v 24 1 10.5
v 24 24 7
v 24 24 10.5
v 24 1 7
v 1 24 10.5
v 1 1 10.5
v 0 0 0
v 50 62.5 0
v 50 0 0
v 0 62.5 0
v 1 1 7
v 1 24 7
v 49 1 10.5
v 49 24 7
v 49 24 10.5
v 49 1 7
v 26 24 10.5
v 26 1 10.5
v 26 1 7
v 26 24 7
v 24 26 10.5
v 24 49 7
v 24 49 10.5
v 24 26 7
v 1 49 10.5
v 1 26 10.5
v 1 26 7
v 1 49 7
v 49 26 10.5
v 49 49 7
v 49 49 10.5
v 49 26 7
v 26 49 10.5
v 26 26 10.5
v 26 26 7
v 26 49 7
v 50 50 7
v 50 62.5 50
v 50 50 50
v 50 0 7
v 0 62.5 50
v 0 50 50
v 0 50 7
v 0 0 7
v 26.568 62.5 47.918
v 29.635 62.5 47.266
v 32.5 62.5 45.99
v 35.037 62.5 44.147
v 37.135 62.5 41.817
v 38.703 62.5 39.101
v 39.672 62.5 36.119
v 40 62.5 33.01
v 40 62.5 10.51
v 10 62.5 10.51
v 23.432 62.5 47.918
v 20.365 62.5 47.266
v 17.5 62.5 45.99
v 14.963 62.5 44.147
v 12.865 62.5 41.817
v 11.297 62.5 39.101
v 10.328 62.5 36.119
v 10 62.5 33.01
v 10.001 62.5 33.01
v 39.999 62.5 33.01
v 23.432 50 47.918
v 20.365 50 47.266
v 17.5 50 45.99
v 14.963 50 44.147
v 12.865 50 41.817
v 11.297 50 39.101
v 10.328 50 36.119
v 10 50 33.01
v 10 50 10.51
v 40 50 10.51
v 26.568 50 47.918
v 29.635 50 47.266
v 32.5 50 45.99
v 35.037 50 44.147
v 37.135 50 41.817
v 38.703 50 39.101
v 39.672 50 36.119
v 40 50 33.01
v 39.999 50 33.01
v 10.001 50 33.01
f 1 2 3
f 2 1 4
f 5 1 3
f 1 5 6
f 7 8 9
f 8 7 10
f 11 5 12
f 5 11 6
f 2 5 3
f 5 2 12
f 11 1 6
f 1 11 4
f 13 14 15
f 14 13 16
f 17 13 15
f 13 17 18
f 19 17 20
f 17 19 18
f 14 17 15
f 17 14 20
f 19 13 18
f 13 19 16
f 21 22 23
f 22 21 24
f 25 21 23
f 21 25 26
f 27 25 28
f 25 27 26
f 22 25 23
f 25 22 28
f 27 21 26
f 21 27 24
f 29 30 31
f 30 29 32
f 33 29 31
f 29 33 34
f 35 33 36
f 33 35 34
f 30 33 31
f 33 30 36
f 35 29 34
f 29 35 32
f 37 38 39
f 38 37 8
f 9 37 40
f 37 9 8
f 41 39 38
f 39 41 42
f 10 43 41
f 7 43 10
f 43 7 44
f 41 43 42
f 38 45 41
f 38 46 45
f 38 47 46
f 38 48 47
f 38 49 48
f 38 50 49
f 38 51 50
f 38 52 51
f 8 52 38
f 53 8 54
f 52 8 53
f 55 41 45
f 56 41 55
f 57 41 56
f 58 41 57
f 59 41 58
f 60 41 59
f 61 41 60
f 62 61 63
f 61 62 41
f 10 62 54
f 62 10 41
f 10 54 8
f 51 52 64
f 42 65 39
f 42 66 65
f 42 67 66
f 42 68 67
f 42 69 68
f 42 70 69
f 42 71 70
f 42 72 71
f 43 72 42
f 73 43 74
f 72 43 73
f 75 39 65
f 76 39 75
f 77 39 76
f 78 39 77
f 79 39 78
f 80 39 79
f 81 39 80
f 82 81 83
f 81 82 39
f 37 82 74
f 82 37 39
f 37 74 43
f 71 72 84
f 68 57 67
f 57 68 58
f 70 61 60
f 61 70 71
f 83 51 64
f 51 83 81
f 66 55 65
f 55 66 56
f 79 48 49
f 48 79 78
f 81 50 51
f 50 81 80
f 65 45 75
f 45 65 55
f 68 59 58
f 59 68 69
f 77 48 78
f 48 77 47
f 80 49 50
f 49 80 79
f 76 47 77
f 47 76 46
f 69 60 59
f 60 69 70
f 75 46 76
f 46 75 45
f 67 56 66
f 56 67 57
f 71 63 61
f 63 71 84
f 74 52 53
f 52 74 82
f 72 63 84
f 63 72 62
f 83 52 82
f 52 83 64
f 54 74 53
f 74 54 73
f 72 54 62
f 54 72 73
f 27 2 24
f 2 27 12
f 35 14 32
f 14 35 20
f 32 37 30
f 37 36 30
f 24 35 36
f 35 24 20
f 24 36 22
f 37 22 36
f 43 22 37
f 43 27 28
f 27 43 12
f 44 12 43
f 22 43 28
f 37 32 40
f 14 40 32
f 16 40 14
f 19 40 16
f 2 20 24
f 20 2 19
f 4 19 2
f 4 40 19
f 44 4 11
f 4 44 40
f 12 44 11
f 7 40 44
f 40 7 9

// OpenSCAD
color("LightGray") {
    translate([1,1,0]) cube([23,23,6+4.5]);
    translate([25+1,1,0]) cube([23,23,6+4.5]);
    translate([1,25+1,0]) cube([23,23,6+4.5]);
    translate([25+1,25+1,0]) cube([23,23,6+4.5]);
}
color("Grey") {
    cube([50,50,7]);
    difference() {
        translate([0,50,0]) cube([50,12.5,50]);
        translate([25,25,6+27]) rotate([-90,0,0]) cylinder(50,15,15);
        translate([10,25,6+4.51]) cube([30,50,27-4.5]);
    }
}
